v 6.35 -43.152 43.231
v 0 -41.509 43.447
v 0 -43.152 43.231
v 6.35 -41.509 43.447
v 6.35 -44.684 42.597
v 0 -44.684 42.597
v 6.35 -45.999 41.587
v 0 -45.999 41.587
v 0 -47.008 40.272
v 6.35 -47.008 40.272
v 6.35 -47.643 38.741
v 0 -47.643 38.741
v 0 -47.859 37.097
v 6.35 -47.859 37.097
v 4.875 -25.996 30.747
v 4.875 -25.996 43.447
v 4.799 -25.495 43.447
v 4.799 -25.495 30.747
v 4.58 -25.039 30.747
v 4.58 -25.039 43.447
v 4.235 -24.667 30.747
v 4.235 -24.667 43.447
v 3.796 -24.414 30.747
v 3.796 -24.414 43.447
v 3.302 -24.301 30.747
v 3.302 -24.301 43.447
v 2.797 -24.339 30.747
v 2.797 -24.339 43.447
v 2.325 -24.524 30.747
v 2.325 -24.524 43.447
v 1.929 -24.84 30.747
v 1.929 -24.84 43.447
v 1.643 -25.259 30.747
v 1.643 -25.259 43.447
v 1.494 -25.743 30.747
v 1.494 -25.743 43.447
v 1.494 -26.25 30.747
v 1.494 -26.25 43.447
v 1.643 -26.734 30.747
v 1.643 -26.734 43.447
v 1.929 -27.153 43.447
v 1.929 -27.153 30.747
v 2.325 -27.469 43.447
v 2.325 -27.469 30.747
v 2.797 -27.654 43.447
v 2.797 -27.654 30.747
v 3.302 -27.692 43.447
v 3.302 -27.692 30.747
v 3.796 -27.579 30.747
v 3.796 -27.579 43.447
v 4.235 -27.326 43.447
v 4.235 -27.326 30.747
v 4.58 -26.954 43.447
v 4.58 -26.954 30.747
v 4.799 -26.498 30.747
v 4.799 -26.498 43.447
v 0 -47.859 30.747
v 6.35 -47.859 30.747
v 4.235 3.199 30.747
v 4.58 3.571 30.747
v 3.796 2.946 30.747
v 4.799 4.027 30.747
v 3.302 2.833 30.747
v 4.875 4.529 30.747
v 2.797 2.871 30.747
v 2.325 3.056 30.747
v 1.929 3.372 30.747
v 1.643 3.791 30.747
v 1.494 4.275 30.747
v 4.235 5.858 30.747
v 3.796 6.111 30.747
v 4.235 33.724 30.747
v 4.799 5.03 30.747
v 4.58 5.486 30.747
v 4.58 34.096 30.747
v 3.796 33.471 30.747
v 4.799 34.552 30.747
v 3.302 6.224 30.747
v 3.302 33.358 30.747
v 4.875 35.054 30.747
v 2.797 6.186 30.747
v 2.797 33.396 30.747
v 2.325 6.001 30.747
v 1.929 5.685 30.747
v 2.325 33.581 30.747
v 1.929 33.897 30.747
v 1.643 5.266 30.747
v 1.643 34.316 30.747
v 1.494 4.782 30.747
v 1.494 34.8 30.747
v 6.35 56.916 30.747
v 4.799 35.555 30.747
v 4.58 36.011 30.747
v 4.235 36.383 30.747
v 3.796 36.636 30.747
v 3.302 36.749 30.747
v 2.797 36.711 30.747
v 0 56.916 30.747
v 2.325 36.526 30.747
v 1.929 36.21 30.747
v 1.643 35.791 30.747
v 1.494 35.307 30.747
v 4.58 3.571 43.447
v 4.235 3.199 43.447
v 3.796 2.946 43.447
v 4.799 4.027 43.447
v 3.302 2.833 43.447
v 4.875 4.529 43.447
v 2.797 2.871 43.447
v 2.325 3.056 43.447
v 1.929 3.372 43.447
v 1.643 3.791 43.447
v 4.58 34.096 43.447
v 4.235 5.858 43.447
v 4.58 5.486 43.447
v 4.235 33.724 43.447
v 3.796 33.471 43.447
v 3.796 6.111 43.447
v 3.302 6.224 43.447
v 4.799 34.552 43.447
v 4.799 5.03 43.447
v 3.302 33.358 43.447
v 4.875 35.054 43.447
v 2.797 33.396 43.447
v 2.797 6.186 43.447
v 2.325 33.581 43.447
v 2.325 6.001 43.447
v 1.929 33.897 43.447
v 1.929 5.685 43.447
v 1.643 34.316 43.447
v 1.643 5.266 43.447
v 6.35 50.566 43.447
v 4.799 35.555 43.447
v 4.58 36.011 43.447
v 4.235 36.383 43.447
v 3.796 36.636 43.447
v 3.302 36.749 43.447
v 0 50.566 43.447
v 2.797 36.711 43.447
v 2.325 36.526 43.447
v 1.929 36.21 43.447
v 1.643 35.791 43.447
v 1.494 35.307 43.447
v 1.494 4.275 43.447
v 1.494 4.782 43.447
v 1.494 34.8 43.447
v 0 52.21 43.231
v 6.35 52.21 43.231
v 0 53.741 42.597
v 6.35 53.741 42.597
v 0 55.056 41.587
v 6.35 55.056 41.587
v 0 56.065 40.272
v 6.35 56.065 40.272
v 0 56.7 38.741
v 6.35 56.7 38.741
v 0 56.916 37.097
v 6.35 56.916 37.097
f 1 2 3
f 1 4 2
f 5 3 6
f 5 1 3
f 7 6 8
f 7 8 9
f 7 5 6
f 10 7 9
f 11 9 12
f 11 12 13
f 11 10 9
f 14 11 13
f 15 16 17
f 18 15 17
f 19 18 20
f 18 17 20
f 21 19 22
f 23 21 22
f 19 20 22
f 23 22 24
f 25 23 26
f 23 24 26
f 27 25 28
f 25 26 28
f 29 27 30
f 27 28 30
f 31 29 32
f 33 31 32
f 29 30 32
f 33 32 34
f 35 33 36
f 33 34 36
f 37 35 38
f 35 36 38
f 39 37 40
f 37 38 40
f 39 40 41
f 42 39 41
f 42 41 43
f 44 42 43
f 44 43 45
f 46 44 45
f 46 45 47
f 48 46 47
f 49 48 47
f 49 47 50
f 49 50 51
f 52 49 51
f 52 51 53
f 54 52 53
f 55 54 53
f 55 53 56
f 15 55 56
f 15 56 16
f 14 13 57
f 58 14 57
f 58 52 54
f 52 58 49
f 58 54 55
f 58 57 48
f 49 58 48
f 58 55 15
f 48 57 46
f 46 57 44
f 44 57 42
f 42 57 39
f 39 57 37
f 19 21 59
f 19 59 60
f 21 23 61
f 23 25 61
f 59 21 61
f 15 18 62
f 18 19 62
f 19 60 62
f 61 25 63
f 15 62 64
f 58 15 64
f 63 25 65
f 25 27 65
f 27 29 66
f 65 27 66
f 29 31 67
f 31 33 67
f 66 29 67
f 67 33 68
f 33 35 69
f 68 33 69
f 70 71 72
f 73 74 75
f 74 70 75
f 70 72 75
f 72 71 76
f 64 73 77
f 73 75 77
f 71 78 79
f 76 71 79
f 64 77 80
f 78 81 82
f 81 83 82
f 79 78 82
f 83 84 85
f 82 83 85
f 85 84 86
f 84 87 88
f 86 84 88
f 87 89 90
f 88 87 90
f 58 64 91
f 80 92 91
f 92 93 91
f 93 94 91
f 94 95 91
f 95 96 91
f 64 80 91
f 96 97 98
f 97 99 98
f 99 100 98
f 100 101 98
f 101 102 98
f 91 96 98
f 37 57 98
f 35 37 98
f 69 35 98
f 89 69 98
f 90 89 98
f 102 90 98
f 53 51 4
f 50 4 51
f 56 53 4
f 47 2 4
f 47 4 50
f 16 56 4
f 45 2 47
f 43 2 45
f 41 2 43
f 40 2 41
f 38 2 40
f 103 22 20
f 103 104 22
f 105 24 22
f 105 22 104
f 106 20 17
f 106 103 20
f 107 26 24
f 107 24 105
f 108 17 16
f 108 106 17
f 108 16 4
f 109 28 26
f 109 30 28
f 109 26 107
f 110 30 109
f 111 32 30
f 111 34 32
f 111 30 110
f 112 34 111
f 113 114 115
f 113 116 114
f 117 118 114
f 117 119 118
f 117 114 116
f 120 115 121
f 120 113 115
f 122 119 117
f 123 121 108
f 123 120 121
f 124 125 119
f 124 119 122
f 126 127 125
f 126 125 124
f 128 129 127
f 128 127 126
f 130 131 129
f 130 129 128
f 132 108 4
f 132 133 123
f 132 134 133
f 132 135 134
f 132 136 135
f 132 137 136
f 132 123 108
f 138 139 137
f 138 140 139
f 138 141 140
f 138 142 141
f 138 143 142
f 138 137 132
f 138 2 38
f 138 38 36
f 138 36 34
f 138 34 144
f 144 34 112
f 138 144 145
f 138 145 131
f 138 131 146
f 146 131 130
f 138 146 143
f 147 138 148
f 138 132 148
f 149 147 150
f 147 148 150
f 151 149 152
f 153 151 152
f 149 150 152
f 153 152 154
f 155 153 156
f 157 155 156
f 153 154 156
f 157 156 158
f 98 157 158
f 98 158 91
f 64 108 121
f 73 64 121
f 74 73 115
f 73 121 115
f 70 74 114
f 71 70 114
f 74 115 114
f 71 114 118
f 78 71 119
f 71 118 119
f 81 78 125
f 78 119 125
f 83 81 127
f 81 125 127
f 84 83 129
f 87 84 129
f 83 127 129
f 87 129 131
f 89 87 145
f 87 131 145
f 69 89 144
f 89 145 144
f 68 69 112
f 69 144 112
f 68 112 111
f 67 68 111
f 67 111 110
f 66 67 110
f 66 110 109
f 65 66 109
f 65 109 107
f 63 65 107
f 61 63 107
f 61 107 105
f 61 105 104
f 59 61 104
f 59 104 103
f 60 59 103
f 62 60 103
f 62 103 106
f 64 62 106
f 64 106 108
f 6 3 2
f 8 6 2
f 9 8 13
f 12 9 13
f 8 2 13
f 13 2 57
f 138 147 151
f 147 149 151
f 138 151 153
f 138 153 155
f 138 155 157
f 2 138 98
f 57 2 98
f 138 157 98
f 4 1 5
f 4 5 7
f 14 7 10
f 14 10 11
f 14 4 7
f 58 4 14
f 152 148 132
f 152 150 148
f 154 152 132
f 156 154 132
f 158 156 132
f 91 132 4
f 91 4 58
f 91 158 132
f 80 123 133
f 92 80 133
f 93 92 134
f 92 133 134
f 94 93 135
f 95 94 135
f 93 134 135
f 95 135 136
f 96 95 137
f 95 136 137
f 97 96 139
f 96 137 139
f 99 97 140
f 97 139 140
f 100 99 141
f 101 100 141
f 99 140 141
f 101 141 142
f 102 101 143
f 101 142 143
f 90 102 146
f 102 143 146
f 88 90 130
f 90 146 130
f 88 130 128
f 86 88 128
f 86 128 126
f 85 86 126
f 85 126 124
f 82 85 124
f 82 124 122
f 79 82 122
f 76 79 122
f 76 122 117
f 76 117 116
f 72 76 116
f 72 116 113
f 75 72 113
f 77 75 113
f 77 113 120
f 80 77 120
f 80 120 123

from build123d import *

# Parameters (mm, degrees)
SKETCH1_W            = 12.7
SKETCH1_H            = 104.775
BOSS_EXTRUDE1_DEPTH  = 6.35
M3_CLEARANCE_HOLE1_D = 3.4
FILLET1_R            = 6.35


with BuildPart() as part:
    # Sketch1 → Boss-Extrude1 (new body)
    with BuildSketch(Plane(origin=(0, 0, 0), x_dir=(0, 0, -1), z_dir=(1, 0, 0))):
        with Locations((-37.097368421, 4.528552632)):
            Rectangle(SKETCH1_W, SKETCH1_H)
    extrude(amount=BOSS_EXTRUDE1_DEPTH)

    # M3 Clearance Hole1 (through all)
    with Locations(Plane(origin=(0, 0, 30.747368421), x_dir=(-1, 0, 0), z_dir=(0, 0, -1))):
        with Locations((-3.175, -25.996447368), (-3.175, 4.528552632), (-3.175, 35.053552632)):
            Hole(M3_CLEARANCE_HOLE1_D / 2)

    # Fillet1
    fillet1_edges = [part.edges().sort_by_distance(p)[0] for p in [
        (3.175, -47.858947368, 43.447368421),
        (3.175, 56.916052632, 43.447368421),
    ]]
    fillet(fillet1_edges, radius=FILLET1_R)


solid = part.part
